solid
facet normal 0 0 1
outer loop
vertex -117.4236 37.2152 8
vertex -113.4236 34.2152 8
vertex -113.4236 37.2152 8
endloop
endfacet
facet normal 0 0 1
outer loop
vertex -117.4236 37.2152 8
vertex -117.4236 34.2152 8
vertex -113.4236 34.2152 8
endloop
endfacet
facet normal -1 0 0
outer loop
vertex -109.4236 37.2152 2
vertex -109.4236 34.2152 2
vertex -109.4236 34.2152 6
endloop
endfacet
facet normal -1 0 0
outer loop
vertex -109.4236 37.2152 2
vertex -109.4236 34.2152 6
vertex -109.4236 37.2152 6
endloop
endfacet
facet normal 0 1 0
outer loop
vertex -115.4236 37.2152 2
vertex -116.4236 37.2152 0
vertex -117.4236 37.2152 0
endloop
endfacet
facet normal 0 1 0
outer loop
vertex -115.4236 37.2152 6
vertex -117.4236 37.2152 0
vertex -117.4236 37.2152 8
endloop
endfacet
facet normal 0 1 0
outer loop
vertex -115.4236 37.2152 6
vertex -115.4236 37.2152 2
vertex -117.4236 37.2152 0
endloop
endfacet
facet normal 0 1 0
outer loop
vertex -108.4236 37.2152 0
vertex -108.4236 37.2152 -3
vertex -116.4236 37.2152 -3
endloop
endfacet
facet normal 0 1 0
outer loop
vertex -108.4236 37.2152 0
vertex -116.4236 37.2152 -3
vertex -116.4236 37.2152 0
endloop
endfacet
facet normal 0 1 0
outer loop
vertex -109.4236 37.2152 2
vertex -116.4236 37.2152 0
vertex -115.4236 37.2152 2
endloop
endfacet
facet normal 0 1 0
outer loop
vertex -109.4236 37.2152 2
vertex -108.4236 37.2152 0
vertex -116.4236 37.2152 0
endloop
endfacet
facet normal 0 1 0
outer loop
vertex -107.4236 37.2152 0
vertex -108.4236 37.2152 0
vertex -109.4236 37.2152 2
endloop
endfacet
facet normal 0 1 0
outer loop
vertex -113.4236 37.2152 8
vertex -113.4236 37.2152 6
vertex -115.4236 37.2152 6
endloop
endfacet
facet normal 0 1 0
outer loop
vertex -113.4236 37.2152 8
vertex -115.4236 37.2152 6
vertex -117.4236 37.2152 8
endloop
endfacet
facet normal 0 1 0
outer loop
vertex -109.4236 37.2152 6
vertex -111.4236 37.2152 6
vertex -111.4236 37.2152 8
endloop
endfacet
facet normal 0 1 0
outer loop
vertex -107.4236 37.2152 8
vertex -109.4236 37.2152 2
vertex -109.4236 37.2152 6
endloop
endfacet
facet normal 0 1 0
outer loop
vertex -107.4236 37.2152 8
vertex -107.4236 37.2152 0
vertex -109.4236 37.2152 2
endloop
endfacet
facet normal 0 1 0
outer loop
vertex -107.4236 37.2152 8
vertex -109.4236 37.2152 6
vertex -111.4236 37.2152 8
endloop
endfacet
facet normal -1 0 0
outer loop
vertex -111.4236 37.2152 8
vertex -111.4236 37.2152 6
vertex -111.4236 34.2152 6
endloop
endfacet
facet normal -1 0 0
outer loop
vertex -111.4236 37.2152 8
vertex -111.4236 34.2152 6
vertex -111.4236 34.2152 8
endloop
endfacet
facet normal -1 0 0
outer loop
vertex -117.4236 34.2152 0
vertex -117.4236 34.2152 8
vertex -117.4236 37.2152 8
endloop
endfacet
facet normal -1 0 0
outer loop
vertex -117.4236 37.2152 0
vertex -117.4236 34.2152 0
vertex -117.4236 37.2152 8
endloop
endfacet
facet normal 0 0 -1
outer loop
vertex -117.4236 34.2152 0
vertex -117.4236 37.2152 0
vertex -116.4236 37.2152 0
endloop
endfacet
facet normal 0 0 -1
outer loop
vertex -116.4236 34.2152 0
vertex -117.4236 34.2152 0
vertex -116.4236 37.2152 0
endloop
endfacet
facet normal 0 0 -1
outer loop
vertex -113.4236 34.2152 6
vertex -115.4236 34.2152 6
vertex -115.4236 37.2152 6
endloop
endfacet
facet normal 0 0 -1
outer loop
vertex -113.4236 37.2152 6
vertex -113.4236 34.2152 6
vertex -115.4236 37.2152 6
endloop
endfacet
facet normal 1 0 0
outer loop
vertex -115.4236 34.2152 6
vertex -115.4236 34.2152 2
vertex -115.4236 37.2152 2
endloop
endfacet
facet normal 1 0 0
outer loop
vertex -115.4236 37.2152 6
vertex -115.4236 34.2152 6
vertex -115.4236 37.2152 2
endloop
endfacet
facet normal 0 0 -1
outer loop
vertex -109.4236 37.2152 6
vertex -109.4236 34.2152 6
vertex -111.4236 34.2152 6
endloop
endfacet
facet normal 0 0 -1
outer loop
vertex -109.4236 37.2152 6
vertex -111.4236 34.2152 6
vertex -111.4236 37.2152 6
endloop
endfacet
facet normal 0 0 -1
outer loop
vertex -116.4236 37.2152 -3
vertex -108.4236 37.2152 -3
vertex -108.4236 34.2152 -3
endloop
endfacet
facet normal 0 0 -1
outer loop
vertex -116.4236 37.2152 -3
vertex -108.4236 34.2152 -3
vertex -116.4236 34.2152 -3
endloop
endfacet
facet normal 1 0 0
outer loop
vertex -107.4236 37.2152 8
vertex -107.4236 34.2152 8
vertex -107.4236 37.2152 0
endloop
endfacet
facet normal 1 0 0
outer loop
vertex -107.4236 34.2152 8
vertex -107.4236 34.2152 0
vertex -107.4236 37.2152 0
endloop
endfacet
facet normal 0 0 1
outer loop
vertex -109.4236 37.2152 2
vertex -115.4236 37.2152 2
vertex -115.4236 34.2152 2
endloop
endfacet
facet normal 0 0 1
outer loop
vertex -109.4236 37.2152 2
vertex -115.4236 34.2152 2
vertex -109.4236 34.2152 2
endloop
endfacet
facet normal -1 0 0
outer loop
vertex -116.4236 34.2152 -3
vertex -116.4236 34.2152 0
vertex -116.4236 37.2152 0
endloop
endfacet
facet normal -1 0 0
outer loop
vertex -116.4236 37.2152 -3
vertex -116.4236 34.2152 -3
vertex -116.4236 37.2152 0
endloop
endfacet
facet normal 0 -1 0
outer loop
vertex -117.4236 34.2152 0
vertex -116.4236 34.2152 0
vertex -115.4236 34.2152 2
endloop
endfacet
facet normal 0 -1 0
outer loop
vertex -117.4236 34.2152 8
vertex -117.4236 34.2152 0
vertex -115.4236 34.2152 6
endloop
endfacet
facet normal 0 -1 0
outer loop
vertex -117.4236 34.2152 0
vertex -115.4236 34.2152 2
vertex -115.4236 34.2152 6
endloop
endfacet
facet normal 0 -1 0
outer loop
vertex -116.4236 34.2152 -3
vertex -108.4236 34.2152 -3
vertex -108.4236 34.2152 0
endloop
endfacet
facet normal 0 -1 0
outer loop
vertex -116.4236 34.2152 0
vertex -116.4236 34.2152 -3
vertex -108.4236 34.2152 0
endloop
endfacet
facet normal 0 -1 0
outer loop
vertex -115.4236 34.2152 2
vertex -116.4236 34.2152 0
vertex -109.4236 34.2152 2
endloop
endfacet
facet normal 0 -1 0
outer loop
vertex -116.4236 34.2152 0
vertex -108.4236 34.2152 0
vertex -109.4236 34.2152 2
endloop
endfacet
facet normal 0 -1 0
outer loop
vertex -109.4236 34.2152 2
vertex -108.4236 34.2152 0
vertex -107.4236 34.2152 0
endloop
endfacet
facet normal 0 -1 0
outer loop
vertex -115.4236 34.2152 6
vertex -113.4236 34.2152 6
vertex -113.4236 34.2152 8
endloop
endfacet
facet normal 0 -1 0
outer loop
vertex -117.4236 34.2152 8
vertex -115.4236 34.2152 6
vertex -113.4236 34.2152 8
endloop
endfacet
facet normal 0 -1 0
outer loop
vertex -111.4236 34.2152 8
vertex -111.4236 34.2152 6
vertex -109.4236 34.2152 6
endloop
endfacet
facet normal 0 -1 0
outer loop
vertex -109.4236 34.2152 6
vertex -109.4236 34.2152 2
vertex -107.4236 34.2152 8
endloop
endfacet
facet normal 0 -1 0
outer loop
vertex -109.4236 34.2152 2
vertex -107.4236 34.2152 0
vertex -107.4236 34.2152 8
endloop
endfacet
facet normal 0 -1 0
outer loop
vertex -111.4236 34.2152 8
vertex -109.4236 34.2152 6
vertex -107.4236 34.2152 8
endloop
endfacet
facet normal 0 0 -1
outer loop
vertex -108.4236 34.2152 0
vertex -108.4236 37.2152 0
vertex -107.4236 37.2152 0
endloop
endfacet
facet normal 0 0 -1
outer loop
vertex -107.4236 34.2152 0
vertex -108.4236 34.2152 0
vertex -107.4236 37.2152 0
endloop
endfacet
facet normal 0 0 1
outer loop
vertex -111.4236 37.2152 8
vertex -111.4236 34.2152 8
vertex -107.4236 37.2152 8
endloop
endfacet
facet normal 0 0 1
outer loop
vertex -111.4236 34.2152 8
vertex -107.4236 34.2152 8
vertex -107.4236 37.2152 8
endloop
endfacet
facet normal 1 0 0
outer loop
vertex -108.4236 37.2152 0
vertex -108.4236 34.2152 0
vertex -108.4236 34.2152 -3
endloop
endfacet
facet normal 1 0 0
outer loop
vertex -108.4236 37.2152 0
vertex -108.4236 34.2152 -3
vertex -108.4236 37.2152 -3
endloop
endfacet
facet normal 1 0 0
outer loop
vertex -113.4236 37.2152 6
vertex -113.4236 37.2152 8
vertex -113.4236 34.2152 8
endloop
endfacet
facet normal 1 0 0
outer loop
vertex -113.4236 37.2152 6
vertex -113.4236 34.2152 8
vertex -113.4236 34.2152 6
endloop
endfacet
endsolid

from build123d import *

# Parameters (mm, degrees)
SKETCH4_W           = 10
SKETCH4_H           = 3
BOSS_EXTRUDE2_DEPTH = 2
SKETCH5_W           = 4
SKETCH5_H           = 3
BOSS_EXTRUDE3_DEPTH = 3
SKETCH6_W           = 2
SKETCH6_H           = 3
BOSS_EXTRUDE4_DEPTH = 6
SKETCH7_W           = 2
SKETCH7_H           = 3
BOSS_EXTRUDE5_DEPTH = 2
SKETCH8_W           = 2
SKETCH8_H           = 3
BOSS_EXTRUDE6_DEPTH = 2


with BuildPart() as part:
    # Sketch4 → Boss-Extrude2 (new body)
    with BuildSketch(Plane.XY):
        with Locations((-112.42360649, 35.715193832)):
            Rectangle(SKETCH4_W, SKETCH4_H)
    extrude(amount=BOSS_EXTRUDE2_DEPTH)

    # Sketch5 → Boss-Extrude3 (add)
    with BuildSketch(Plane(origin=(0, 0, 0), x_dir=(-1, 0, 0), z_dir=(0, 0, -1))):
        with Locations((114.42360649, 35.715193832)):
            Rectangle(SKETCH5_W, SKETCH5_H)
        with Locations((110.42360649, 35.715193832)):
            Rectangle(SKETCH5_W, SKETCH5_H)
    extrude(amount=BOSS_EXTRUDE3_DEPTH)

    # Sketch6 → Boss-Extrude4 (add)
    with BuildSketch(Plane.XY.offset(2)):
        with Locations((-108.42360649, 35.715193832)):
            Rectangle(SKETCH6_W, SKETCH6_H)
        with Locations((-116.42360649, 35.715193832)):
            Rectangle(SKETCH6_W, SKETCH6_H)
    extrude(amount=BOSS_EXTRUDE4_DEPTH)

    # Sketch7 → Boss-Extrude5 (add)
    with BuildSketch(Plane(origin=(-115.42360649, 0, 0), x_dir=(0, 0, -1), z_dir=(1, 0, 0))):
        with Locations((-7, 35.715193832)):
            Rectangle(SKETCH7_W, SKETCH7_H)
    extrude(amount=BOSS_EXTRUDE5_DEPTH)

    # Sketch8 → Boss-Extrude6 (add)
    with BuildSketch(Plane.ZY.offset(109.42360649)):
        with Locations((7, 35.715193832)):
            Rectangle(SKETCH8_W, SKETCH8_H)
    extrude(amount=BOSS_EXTRUDE6_DEPTH)


solid = part.part
